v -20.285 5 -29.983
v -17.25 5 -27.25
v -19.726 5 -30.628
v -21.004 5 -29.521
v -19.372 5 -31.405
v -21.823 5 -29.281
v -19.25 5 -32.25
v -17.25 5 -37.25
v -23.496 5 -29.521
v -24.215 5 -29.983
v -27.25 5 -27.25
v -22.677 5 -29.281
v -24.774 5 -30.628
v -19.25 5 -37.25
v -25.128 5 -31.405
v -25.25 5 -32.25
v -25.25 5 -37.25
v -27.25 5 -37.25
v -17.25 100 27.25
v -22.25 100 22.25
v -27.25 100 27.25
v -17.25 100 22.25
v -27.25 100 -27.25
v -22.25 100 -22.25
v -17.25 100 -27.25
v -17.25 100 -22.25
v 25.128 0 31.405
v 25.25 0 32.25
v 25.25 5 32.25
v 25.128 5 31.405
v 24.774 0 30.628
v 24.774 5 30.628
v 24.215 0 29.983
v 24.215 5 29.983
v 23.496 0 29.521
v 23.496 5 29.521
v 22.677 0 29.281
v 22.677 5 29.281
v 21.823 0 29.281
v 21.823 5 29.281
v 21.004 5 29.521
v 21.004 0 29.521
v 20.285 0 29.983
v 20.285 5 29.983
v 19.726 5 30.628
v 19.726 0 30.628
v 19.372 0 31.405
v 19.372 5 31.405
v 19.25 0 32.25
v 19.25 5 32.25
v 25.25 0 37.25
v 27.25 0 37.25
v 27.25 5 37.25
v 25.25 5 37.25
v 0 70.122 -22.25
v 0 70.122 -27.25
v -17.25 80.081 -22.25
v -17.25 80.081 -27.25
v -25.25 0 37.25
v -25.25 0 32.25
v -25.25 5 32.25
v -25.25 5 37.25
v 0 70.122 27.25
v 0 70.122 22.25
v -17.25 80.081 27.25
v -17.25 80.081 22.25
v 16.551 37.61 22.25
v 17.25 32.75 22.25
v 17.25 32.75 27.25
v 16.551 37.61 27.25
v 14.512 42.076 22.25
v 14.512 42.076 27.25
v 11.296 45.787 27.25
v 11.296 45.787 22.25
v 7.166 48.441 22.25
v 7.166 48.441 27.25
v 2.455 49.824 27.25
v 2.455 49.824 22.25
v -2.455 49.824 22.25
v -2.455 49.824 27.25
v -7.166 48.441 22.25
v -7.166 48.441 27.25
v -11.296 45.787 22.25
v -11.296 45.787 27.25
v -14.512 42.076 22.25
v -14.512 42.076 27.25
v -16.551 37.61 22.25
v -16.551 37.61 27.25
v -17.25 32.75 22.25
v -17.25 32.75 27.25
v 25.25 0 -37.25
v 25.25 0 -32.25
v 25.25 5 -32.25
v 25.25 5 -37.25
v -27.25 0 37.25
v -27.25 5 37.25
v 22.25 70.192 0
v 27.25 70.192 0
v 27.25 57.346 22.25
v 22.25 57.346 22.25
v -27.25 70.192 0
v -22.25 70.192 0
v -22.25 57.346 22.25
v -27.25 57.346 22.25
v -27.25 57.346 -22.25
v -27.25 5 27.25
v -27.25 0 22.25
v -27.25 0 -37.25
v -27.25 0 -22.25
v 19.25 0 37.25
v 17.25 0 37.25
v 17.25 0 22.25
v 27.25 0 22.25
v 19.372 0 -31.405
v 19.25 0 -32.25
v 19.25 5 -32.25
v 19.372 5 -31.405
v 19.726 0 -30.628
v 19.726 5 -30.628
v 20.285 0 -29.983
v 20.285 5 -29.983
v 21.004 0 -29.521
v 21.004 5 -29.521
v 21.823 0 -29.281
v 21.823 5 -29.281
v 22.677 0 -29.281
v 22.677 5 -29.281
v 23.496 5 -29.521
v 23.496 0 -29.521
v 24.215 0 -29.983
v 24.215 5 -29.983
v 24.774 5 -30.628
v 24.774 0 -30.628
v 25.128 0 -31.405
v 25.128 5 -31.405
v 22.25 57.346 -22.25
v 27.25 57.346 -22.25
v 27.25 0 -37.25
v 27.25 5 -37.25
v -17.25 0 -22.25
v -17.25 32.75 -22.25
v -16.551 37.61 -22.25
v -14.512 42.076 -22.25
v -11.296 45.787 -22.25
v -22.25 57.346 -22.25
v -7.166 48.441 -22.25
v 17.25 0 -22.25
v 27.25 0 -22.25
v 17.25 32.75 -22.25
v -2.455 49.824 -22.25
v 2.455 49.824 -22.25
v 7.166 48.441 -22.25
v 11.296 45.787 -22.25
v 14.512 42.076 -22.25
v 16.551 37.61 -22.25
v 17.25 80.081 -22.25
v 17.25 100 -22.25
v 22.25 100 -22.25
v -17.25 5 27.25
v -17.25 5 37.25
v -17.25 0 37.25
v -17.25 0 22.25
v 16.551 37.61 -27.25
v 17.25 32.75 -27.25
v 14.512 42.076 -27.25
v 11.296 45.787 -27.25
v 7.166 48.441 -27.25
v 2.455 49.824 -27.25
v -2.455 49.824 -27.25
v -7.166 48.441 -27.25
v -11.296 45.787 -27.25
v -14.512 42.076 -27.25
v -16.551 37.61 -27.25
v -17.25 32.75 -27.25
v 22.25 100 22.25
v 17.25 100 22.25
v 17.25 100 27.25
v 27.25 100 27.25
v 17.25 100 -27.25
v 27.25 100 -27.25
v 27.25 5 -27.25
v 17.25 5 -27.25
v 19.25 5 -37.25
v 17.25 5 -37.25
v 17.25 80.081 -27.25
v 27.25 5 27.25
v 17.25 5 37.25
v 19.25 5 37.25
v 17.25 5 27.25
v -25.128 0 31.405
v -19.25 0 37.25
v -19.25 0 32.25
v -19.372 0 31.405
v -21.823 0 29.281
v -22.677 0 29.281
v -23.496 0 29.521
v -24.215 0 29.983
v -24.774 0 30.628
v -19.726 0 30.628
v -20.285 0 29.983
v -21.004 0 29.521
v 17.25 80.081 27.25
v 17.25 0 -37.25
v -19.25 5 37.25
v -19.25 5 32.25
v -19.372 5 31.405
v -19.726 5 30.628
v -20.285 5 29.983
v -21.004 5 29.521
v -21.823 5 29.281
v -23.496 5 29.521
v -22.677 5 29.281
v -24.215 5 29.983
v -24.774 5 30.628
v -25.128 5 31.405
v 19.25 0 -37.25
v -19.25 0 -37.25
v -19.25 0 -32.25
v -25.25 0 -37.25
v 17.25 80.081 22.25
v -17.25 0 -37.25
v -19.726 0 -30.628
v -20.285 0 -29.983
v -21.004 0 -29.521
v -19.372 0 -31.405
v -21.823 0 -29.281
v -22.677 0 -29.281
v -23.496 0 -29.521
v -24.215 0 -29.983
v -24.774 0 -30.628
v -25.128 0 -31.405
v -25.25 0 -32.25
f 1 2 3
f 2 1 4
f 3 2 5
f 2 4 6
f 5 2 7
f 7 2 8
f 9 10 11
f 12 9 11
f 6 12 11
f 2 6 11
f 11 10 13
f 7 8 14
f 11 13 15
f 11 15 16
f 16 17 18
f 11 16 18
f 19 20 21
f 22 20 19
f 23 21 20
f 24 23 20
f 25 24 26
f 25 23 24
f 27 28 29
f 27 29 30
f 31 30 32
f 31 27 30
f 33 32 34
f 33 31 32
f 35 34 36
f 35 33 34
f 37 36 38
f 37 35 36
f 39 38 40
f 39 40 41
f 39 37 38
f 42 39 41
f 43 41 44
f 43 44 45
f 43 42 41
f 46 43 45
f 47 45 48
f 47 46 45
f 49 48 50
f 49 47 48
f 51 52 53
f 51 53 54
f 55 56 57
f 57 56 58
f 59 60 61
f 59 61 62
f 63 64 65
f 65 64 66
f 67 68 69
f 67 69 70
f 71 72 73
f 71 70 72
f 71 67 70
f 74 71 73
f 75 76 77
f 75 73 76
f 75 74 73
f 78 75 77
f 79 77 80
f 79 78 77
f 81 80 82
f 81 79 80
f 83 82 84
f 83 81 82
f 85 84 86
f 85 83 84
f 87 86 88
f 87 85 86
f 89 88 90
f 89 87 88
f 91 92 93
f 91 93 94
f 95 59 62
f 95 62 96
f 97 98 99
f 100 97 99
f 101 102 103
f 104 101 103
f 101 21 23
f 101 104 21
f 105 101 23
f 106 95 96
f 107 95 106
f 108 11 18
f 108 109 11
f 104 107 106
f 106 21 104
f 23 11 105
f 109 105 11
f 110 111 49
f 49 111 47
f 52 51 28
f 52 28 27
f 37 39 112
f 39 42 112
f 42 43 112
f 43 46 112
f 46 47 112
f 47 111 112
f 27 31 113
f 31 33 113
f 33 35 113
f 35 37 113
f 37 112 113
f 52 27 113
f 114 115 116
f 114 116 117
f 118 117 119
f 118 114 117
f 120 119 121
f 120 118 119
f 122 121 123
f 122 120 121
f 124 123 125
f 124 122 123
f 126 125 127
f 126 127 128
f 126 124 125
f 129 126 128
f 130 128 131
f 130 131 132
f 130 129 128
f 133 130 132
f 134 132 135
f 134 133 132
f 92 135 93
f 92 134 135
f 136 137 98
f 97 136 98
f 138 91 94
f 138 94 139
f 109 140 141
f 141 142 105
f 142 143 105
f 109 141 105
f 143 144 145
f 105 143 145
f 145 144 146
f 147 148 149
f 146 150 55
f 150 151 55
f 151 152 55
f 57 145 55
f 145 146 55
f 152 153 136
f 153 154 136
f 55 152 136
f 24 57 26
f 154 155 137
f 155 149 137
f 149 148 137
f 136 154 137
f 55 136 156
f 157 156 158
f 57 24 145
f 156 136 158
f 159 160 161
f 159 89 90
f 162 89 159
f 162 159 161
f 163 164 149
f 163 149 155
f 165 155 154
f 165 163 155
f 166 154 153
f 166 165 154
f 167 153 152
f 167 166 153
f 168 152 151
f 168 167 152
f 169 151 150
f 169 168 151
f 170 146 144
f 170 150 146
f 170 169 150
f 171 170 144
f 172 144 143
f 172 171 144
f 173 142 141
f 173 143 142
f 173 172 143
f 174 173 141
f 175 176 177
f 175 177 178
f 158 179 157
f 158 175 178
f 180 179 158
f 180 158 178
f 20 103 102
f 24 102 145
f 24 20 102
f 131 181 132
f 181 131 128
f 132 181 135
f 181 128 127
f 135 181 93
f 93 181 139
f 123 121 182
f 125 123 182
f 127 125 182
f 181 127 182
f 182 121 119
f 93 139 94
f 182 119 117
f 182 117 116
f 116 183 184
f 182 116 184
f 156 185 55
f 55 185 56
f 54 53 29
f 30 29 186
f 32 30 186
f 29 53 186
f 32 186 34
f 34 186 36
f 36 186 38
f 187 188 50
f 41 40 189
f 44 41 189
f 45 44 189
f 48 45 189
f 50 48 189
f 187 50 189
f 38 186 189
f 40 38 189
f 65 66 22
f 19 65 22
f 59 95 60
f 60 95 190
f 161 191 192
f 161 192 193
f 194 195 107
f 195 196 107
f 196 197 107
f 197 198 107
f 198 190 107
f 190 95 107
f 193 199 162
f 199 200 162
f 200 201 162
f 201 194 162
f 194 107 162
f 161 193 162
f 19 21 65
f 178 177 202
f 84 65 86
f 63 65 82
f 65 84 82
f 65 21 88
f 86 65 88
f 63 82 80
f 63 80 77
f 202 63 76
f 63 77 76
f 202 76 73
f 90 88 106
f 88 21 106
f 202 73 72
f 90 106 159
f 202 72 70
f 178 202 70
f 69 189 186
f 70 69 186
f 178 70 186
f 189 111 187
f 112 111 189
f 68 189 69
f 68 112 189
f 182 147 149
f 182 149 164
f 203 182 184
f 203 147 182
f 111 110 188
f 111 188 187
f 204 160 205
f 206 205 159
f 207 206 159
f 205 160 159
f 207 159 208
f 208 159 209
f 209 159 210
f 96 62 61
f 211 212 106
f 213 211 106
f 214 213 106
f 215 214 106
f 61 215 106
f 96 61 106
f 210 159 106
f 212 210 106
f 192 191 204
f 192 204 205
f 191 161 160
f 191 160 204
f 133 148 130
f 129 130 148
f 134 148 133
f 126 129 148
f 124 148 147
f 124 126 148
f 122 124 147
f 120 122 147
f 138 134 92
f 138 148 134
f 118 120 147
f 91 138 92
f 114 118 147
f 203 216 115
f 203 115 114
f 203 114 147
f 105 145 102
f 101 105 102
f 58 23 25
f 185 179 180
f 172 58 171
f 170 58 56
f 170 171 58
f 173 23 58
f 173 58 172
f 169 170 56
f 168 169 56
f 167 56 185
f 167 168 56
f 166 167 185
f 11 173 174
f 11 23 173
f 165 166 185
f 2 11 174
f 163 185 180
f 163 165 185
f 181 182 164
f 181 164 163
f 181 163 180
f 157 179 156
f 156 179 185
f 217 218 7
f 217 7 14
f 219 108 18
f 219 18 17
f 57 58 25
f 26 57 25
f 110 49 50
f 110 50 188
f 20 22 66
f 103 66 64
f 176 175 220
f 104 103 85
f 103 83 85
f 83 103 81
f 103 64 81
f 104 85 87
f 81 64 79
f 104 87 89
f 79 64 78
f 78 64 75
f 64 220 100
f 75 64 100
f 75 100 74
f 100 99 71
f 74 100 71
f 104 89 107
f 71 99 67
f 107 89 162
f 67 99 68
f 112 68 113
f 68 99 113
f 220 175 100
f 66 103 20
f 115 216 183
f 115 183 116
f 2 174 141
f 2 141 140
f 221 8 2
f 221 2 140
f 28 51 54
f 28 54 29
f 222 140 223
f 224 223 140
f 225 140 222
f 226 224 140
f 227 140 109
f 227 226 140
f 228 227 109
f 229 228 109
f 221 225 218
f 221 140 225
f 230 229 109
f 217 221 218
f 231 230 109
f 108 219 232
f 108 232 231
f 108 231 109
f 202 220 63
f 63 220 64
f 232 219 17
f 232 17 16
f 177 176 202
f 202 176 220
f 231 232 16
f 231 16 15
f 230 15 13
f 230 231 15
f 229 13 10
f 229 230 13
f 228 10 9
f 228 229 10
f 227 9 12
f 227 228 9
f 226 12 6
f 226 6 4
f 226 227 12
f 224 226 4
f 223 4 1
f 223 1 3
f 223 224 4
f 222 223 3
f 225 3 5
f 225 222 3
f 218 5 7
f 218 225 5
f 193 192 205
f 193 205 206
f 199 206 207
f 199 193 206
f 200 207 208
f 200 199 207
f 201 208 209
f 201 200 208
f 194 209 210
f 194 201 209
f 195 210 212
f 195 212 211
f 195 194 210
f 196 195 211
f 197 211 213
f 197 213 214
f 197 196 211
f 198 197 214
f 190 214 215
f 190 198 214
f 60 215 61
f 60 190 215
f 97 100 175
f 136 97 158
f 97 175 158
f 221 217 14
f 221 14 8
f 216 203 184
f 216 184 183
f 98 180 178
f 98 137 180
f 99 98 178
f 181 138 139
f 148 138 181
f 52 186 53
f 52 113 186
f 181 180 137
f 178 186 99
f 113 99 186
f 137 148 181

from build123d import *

# Parameters (mm, degrees)
ESQUISSE1_W             = 54.5
ESQUISSE1_H             = 54.5
BOSS_EXTRU_1_DEPTH      = 100
ENL_V_MAT_EXTRU_1_DEPTH = 55.5
ESQUISSE4_W             = 44.5
ESQUISSE4_H             = 44.5
ENL_V_MAT_EXTRU_3_DEPTH = 101
ENL_V_MAT_EXTRU_7_DEPTH = 55.5
BOSS_EXTRU_2_DEPTH      = 5


with BuildPart() as part:
    # Esquisse1 → Boss.-Extru.1 (new body)
    with BuildSketch(Plane(origin=(0, 0, 0), x_dir=(1, 0, 0), z_dir=(0, 1, 0))):
        Rectangle(ESQUISSE1_W, ESQUISSE1_H)
    extrude(amount=BOSS_EXTRU_1_DEPTH)

    # Esquisse2 → Enlèv. mat.-Extru.1 (cut, through all)
    with BuildSketch(Plane(origin=(27.25, 0, 0), x_dir=(0, 0, -1), z_dir=(1, 0, 0))):
        Polygon((-22.25, 0), (22.25, 0), (22.25, 44.5), (22.25, 57.346043489), (0, 70.192086979), (-22.25, 57.346043489), (-22.25, 44.5), align=None)
    extrude(amount=-ENL_V_MAT_EXTRU_1_DEPTH, mode=Mode.SUBTRACT)

    # Esquisse4 → Enlèv. mat.-Extru.3 (cut, through all)
    with BuildSketch(Plane(origin=(0, 100, 0), x_dir=(1, 0, 0), z_dir=(0, 1, 0))):
        Rectangle(ESQUISSE4_W, ESQUISSE4_H)
    extrude(amount=-ENL_V_MAT_EXTRU_3_DEPTH, mode=Mode.SUBTRACT)

    # Esquisse6 → Enlèv. mat.-Extru.7 (cut, through all)
    with BuildSketch(Plane(origin=(0, 0, -27.25), x_dir=(-1, 0, 0), z_dir=(0, 0, -1))):
        Polygon((0, 109.959292144), (-17.25, 100), (-17.25, 80.081415713), (0, 70.122123569), (17.25, 80.081415713), (17.25, 100), align=None)
        with BuildLine():
            Line((17.25, 0), (-17.25, 0))
            Line((-17.25, 0), (-17.25, 32.75))
            ThreePointArc((-17.25, 32.75), (0, 50), (17.25, 32.75))
            Line((17.25, 32.75), (17.25, 0))
        make_face()
    extrude(amount=-ENL_V_MAT_EXTRU_7_DEPTH, mode=Mode.SUBTRACT)

    # Esquisse11 → Boss.-Extru.2 (add)
    with BuildSketch(Plane(origin=(0, 0, 0), x_dir=(1, 0, 0), z_dir=(0, 1, 0))):
        with BuildLine():
            Line((19.25, 37.25), (19.25, 32.25))
            ThreePointArc((19.25, 32.25), (22.25, 29.25), (25.25, 32.25))
            Line((25.25, 32.25), (25.25, 37.25))
            Line((25.25, 37.25), (27.25, 37.25))
            Line((27.25, 37.25), (27.25, 22.25))
            Line((27.25, 22.25), (17.25, 22.25))
            Line((17.25, 22.25), (17.25, 37.25))
            Line((17.25, 37.25), (19.25, 37.25))
        make_face()
        with BuildLine():
            Line((-17.25, 22.25), (-27.25, 22.25))
            Line((-27.25, 22.25), (-27.25, 37.25))
            Line((-27.25, 37.25), (-25.25, 37.25))
            Line((-25.25, 37.25), (-25.25, 32.25))
            ThreePointArc((-25.25, 32.25), (-22.25, 29.25), (-19.25, 32.25))
            Line((-19.25, 32.25), (-19.25, 37.25))
            Line((-19.25, 37.25), (-17.25, 37.25))
            Line((-17.25, 37.25), (-17.25, 22.25))
        make_face()
        with BuildLine():
            Line((17.25, -22.25), (27.25, -22.25))
            Line((27.25, -22.25), (27.25, -37.25))
            Line((27.25, -37.25), (25.25, -37.25))
            Line((25.25, -37.25), (25.25, -32.25))
            ThreePointArc((25.25, -32.25), (22.25, -29.25), (19.25, -32.25))
            Line((19.25, -32.25), (19.25, -37.25))
            Line((19.25, -37.25), (17.25, -37.25))
            Line((17.25, -37.25), (17.25, -22.25))
        make_face()
        with BuildLine():
            Line((-19.25, -37.25), (-19.25, -32.25))
            ThreePointArc((-19.25, -32.25), (-22.25, -29.25), (-25.25, -32.25))
            Line((-25.25, -32.25), (-25.25, -37.25))
            Line((-25.25, -37.25), (-27.25, -37.25))
            Line((-27.25, -37.25), (-27.25, -22.25))
            Line((-27.25, -22.25), (-17.25, -22.25))
            Line((-17.25, -22.25), (-17.25, -37.25))
            Line((-17.25, -37.25), (-19.25, -37.25))
        make_face()
    extrude(amount=BOSS_EXTRU_2_DEPTH)


solid = part.part
